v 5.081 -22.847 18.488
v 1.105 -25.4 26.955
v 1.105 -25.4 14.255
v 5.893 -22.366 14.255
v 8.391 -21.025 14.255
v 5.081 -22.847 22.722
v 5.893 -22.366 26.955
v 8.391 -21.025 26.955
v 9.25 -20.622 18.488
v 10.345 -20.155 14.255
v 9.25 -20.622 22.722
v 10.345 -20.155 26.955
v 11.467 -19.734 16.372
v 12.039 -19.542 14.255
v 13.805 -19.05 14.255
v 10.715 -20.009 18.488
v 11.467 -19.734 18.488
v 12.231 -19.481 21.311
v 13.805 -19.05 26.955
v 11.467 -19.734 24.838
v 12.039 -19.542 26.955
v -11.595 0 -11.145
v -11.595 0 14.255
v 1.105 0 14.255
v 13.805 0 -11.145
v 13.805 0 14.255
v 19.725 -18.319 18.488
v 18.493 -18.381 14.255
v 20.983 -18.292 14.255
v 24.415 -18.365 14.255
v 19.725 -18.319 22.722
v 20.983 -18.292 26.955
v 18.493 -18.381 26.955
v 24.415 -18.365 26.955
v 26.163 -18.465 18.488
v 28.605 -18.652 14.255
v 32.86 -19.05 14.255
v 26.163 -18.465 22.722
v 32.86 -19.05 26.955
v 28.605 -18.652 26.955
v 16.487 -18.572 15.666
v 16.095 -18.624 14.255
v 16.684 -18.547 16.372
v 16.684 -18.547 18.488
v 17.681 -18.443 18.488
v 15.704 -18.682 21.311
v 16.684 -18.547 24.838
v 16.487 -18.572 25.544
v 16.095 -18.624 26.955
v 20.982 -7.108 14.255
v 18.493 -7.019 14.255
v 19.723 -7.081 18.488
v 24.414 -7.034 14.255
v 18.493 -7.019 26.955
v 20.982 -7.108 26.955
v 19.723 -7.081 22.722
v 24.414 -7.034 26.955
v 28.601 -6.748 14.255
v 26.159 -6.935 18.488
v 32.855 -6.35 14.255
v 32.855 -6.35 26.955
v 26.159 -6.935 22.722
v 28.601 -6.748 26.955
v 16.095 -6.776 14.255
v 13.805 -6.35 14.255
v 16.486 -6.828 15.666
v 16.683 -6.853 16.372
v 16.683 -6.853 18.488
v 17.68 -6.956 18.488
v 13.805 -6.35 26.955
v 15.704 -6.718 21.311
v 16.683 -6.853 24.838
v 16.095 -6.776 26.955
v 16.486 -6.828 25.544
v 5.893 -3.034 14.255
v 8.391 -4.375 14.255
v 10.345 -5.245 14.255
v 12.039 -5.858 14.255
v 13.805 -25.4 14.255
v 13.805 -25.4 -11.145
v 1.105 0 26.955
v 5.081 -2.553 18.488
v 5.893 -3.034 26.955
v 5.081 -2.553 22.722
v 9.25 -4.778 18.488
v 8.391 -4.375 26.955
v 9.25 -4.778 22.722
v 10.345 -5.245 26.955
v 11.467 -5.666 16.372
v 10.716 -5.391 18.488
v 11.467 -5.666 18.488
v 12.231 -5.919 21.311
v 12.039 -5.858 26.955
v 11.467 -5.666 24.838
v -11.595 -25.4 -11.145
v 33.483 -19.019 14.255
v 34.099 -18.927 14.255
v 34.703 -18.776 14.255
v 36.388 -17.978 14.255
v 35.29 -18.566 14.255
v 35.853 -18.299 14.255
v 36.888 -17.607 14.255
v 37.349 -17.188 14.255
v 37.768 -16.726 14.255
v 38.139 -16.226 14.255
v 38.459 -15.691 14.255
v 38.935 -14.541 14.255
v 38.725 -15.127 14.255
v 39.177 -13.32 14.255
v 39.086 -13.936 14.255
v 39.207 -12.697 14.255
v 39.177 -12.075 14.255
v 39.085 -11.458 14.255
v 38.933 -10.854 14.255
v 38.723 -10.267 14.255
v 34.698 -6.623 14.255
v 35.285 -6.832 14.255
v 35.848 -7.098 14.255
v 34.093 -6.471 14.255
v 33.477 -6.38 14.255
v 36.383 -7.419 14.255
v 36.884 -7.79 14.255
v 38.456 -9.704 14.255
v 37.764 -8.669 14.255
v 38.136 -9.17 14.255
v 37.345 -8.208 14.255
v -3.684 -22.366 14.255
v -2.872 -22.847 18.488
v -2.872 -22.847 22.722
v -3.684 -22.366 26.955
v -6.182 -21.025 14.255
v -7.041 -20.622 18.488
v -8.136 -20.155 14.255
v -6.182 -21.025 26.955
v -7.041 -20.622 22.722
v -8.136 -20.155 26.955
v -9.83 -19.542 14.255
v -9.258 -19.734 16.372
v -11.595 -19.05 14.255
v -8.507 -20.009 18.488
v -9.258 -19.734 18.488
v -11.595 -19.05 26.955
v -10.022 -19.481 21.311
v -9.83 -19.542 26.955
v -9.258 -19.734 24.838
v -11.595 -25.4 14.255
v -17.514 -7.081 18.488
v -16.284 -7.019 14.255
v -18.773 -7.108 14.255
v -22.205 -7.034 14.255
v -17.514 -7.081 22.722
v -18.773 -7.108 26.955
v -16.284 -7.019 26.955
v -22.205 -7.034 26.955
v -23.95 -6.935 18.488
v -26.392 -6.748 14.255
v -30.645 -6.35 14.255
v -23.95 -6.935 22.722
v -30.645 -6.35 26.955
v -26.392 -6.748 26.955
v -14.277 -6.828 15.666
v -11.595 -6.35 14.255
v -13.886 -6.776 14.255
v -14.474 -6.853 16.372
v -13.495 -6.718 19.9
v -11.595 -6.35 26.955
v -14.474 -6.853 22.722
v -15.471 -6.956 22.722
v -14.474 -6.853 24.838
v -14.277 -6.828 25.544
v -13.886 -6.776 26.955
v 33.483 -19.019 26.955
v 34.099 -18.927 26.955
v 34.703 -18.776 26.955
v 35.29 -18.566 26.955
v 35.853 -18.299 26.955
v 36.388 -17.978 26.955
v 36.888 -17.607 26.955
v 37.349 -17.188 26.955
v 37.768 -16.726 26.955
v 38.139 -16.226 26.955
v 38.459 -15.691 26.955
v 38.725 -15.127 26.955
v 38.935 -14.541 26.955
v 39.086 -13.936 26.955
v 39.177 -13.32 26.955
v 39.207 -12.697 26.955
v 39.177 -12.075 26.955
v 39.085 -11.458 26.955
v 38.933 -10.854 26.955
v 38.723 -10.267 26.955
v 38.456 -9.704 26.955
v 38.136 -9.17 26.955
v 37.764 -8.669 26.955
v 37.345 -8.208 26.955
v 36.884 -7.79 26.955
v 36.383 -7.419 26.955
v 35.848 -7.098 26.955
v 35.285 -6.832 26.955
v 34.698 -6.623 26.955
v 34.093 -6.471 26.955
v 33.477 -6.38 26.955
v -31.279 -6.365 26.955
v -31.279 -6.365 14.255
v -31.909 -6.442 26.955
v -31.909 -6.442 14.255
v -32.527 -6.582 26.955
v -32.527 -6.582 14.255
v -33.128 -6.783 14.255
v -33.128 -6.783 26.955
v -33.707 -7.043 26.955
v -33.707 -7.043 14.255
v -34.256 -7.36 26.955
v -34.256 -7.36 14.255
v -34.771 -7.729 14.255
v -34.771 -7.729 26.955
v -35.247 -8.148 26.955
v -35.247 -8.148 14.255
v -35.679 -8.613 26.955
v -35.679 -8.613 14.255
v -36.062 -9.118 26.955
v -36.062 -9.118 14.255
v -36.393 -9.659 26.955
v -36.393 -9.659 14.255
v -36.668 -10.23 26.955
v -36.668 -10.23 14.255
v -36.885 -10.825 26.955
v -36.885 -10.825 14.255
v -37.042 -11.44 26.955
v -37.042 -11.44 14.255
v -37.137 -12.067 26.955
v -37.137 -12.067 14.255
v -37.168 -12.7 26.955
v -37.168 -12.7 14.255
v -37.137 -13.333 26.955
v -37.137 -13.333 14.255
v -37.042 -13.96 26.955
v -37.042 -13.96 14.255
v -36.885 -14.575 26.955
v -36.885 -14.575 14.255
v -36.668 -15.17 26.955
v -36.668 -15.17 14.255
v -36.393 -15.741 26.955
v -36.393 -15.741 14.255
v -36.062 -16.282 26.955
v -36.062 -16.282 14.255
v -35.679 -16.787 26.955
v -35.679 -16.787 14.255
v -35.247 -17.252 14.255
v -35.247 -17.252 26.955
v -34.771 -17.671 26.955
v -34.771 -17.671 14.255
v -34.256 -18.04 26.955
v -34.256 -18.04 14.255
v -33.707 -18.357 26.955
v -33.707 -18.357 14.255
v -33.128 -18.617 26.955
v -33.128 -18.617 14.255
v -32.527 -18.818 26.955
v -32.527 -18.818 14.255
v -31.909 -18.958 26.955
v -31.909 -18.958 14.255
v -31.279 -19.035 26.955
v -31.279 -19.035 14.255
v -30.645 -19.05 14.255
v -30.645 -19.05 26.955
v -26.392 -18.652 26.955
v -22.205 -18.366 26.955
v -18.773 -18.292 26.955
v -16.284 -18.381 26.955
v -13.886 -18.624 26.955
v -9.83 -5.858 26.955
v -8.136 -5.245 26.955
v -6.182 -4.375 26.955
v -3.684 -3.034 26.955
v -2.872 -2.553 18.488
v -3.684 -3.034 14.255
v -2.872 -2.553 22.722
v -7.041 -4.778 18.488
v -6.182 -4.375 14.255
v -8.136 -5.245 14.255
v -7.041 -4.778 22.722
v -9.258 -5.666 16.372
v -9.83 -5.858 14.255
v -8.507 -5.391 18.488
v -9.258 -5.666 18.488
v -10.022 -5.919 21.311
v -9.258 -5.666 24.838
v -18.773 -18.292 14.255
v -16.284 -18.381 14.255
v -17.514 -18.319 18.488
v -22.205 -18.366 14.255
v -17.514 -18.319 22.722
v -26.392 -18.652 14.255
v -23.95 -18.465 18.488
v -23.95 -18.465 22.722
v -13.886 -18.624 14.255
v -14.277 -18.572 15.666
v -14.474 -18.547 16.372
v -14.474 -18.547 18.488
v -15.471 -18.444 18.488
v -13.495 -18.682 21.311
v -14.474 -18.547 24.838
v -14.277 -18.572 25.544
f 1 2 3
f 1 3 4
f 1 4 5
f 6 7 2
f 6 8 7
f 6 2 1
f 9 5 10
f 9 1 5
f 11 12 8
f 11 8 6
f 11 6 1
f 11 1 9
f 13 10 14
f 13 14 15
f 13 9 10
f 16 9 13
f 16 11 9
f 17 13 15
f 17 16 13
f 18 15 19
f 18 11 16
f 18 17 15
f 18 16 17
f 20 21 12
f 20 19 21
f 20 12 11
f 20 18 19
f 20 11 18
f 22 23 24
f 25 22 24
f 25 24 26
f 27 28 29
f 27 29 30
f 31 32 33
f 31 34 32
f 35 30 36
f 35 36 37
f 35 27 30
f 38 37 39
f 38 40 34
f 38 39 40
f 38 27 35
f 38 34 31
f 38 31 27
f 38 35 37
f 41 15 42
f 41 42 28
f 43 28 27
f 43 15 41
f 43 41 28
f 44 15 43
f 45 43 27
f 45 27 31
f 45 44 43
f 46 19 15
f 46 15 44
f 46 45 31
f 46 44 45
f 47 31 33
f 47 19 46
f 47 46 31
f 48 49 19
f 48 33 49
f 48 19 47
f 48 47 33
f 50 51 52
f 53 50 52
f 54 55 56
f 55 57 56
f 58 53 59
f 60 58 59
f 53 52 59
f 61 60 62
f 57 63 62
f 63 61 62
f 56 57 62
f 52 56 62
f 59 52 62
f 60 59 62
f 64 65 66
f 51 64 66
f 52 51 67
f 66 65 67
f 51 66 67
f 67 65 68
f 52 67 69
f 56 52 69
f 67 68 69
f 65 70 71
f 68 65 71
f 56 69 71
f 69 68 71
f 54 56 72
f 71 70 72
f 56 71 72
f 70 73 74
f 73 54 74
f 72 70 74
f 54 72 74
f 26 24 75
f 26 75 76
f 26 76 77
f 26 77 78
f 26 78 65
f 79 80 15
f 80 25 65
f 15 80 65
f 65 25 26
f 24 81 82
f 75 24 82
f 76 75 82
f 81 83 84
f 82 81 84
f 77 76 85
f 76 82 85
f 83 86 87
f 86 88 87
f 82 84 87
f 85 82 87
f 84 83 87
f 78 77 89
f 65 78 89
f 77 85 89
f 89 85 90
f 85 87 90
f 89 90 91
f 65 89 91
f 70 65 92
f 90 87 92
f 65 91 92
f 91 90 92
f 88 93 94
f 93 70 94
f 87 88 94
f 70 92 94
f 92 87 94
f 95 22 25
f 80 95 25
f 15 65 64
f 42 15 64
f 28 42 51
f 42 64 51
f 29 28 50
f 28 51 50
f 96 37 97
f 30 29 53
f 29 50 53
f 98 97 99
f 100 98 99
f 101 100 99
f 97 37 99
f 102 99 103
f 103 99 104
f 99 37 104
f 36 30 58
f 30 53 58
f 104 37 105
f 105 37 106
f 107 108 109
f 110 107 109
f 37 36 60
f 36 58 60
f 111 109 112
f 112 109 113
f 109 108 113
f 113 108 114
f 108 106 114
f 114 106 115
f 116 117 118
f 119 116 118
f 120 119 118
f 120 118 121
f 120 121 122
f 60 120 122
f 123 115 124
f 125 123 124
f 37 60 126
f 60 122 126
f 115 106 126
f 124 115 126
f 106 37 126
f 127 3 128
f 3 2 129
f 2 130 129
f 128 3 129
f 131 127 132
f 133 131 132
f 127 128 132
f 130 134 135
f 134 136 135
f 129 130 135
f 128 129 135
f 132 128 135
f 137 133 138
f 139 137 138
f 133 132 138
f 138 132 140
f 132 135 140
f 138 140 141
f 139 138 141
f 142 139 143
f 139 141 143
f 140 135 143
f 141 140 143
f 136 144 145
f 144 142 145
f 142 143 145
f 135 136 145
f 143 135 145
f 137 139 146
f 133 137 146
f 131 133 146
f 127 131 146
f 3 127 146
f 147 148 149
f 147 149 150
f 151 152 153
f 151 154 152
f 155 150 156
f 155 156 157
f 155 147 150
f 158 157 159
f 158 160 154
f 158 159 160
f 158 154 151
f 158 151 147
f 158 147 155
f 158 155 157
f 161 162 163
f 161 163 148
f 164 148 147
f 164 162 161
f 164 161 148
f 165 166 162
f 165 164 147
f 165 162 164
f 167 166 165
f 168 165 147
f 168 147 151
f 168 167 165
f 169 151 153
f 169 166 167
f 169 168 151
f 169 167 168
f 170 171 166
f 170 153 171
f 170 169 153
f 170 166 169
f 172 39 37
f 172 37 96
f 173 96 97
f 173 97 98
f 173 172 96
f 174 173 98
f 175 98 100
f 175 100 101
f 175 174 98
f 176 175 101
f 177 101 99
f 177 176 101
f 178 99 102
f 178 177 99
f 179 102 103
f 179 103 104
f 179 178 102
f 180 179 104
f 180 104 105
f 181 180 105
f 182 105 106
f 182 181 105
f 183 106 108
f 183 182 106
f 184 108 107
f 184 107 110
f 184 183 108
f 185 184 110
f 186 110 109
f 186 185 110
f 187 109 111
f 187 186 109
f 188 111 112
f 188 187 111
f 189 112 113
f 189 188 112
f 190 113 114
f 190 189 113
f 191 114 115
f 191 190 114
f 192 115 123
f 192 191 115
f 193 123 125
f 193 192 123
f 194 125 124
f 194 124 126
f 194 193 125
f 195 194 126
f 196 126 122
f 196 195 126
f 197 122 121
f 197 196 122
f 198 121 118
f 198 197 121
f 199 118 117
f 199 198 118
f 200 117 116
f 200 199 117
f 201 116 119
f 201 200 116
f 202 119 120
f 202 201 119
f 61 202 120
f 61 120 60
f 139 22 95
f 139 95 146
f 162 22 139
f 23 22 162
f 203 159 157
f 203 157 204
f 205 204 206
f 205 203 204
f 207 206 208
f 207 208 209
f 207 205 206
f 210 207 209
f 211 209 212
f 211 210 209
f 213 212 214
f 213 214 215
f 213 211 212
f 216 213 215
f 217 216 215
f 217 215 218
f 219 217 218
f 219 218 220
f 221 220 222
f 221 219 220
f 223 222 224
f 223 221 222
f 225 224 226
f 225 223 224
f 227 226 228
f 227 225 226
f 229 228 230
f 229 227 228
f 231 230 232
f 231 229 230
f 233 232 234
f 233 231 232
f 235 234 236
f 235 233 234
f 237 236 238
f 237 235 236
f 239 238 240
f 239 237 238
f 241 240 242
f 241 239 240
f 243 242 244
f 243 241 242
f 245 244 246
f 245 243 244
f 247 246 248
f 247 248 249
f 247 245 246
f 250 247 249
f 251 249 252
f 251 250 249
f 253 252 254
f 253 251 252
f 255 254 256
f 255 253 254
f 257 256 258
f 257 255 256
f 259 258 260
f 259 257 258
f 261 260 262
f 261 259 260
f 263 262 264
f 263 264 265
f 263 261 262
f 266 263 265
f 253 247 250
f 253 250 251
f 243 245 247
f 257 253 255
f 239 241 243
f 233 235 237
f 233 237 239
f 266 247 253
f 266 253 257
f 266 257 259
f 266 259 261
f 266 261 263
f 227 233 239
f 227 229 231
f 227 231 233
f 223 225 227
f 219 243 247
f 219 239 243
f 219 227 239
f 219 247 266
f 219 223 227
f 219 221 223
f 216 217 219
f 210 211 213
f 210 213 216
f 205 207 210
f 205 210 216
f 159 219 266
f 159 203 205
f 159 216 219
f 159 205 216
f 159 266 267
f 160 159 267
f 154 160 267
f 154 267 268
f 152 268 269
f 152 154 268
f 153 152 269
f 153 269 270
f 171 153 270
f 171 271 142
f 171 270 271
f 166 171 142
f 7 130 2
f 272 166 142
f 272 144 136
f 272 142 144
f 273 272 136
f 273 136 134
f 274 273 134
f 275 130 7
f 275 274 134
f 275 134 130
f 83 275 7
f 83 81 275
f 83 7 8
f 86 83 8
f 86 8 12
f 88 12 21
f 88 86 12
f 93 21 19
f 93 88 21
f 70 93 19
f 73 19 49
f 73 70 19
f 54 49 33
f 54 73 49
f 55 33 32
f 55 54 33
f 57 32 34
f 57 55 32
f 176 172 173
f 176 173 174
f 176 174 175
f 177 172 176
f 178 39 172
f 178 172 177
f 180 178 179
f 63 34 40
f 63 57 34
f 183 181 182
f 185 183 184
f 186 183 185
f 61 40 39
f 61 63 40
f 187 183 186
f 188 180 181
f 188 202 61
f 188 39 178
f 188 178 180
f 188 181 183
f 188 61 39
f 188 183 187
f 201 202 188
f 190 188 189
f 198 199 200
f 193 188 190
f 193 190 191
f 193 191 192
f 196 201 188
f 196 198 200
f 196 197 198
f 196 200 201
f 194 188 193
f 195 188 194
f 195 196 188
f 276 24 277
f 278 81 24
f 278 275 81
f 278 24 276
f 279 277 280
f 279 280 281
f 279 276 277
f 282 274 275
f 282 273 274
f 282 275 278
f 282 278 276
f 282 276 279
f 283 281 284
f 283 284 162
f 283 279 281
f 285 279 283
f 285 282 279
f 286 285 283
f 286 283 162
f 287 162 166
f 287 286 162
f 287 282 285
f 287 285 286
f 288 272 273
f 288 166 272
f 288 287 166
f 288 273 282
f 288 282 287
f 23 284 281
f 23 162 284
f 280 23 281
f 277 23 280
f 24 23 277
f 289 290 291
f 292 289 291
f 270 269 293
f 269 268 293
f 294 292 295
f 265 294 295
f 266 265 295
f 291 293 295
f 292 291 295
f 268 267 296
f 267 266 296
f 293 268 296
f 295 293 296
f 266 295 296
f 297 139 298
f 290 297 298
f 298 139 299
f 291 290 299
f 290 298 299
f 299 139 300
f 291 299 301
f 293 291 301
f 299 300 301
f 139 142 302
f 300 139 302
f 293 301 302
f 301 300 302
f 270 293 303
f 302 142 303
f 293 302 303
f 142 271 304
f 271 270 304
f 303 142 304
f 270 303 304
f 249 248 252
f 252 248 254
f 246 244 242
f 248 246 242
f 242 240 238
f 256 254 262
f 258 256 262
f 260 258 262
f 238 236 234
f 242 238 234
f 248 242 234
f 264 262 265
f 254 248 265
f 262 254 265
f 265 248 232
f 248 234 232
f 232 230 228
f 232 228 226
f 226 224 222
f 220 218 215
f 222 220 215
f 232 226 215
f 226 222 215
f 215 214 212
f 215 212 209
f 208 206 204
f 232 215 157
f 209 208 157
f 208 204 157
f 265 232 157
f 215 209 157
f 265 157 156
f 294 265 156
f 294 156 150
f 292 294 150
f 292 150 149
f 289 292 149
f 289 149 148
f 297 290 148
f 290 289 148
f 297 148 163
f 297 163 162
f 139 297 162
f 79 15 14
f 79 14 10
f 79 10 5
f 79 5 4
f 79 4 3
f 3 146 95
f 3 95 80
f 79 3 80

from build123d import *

# Parameters (mm, degrees)
F0_W     = 25.4
F0_H     = 38.1
F1_DEPTH = 25.4
F2_W     = 19.05
F2_H     = 12.7
F3_DEPTH = 12.7
F5_DEPTH = 12.7
F7_DEPTH = 12.7


with BuildPart() as f1:
    # F0 (on Front) → F1 (new body)
    with BuildSketch(Plane.XZ):
        with Locations((1.1045151994, 7.9051328331)):
            Rectangle(F0_W, F0_H)
    extrude(amount=F1_DEPTH)

    # F2 (on face) → F3 (join)
    with BuildSketch(Plane.XY.offset(26.9551328331)):
        with Locations((-21.1204848006, -12.7)):
            Rectangle(F2_W, F2_H)
        Polygon((13.8045151994, -6.35), (13.8045151994, -19.05), (32.860204035, -19.05), (32.8545151994, -6.35), align=None)
    extrude(amount=-F3_DEPTH)

    # F4 (on face) → F5 (cut)
    with BuildSketch(Plane.XY.offset(26.9551328331)):
        with BuildLine():
            Line((-11.5954848006, -19.05), (-11.5954848006, -25.4))
            Line((-11.5954848006, -25.4), (1.1045151994, -25.4))
            add(Edge.make_bspline(
                [(1.1045151994, -25.4), (-2.8394977605, -22.7929764945), (-6.7835107203, -20.1859529889), (-11.5954848006, -19.05)],
                knots=[0, 0, 0, 0, 0.4633292966, 0.4633292966, 0.4633292966, 0.4633292966], degree=3))
        make_face()
        with BuildLine():
            add(Edge.make_bspline(
                [(1.1045151994, -25.4), (5.0483617358, -22.7930157817), (8.9922082723, -20.1860315634), (13.8045151994, -19.05)],
                knots=[0, 0, 0, 0, 0.4632921748, 0.4632921748, 0.4632921748, 0.4632921748], degree=3))
            Line((1.1045151994, -25.4), (13.8045151994, -25.4))
            Line((13.8045151994, -25.4), (13.8045151994, -19.05))
        make_face()
        with BuildLine():
            add(Edge.make_bspline(
                [(1.1045151994, 0), (5.0485281592, -2.6070235055), (8.992541119, -5.2140470111), (13.8045151994, -6.35)],
                knots=[0, 0, 0, 0, 0.4633292966, 0.4633292966, 0.4633292966, 0.4633292966], degree=3))
            Line((13.8045151994, -6.35), (13.8045151994, 0))
            Line((13.8045151994, 0), (1.1045151994, 0))
        make_face()
        with BuildLine():
            Line((-11.5954848006, 0), (-11.5954848006, -6.35))
            add(Edge.make_bspline(
                [(1.1045151994, 0), (-2.8394977605, -2.6070235055), (-6.7835107203, -5.2140470111), (-11.5954848006, -6.35)],
                knots=[0, 0, 0, 0, 0.4633292966, 0.4633292966, 0.4633292966, 0.4633292966], degree=3))
            Line((1.1045151994, 0), (-11.5954848006, 0))
        make_face()
        with BuildLine():
            add(Edge.make_bspline(
                [(13.8045151994, -19.05), (19.3794049248, -17.7339470577), (26.1198044799, -18.3919735289), (32.860204035, -19.05)],
                knots=[0.4632921748, 0.4632921748, 0.4632921748, 0.4632921748, 1, 1, 1, 1], degree=3))
            Line((13.8045151994, -19.05), (32.860204035, -19.05))
        make_face()
        with BuildLine():
            add(Edge.make_bspline(
                [(13.8045151994, -6.35), (19.3781871724, -7.6657654699), (26.1163511859, -7.007882735), (32.8545151994, -6.35)],
                knots=[0.4633292966, 0.4633292966, 0.4633292966, 0.4633292966, 1, 1, 1, 1], degree=3))
            Line((32.8545151994, -6.35), (13.8045151994, -6.35))
        make_face()
        with BuildLine():
            Line((-11.5954848006, -6.35), (-30.6454848006, -6.35))
            add(Edge.make_bspline(
                [(-11.5954848006, -6.35), (-17.1691567737, -7.6657654699), (-23.9073207872, -7.007882735), (-30.6454848006, -6.35)],
                knots=[0.4633292966, 0.4633292966, 0.4633292966, 0.4633292966, 1, 1, 1, 1], degree=3))
        make_face()
        with BuildLine():
            Line((-30.6454848006, -19.05), (-11.5954848006, -19.05))
            add(Edge.make_bspline(
                [(-11.5954848006, -19.05), (-17.1691567737, -17.7342345301), (-23.9073207872, -18.392117265), (-30.6454848006, -19.05)],
                knots=[0.4633292966, 0.4633292966, 0.4633292966, 0.4633292966, 1, 1, 1, 1], degree=3))
        make_face()
    extrude(amount=-F5_DEPTH, mode=Mode.SUBTRACT)

    # F6 (on face) → F7 (join)
    with BuildSketch(Plane.XY.offset(26.9551328331)):
        with BuildLine():
            ThreePointArc((32.860204035, -19.05), (39.2073596172, -12.6971555822), (32.8545151994, -6.35))
            Line((32.8545151994, -6.35), (32.860204035, -19.05))
        make_face()
        with BuildLine():
            Line((-30.6454848006, -19.05), (-30.6454848006, -6.35))
            ThreePointArc((-30.6454848006, -6.35), (-37.1683022833, -12.7), (-30.6454848006, -19.05))
        make_face()
    extrude(amount=-F7_DEPTH)


solid = f1.part
